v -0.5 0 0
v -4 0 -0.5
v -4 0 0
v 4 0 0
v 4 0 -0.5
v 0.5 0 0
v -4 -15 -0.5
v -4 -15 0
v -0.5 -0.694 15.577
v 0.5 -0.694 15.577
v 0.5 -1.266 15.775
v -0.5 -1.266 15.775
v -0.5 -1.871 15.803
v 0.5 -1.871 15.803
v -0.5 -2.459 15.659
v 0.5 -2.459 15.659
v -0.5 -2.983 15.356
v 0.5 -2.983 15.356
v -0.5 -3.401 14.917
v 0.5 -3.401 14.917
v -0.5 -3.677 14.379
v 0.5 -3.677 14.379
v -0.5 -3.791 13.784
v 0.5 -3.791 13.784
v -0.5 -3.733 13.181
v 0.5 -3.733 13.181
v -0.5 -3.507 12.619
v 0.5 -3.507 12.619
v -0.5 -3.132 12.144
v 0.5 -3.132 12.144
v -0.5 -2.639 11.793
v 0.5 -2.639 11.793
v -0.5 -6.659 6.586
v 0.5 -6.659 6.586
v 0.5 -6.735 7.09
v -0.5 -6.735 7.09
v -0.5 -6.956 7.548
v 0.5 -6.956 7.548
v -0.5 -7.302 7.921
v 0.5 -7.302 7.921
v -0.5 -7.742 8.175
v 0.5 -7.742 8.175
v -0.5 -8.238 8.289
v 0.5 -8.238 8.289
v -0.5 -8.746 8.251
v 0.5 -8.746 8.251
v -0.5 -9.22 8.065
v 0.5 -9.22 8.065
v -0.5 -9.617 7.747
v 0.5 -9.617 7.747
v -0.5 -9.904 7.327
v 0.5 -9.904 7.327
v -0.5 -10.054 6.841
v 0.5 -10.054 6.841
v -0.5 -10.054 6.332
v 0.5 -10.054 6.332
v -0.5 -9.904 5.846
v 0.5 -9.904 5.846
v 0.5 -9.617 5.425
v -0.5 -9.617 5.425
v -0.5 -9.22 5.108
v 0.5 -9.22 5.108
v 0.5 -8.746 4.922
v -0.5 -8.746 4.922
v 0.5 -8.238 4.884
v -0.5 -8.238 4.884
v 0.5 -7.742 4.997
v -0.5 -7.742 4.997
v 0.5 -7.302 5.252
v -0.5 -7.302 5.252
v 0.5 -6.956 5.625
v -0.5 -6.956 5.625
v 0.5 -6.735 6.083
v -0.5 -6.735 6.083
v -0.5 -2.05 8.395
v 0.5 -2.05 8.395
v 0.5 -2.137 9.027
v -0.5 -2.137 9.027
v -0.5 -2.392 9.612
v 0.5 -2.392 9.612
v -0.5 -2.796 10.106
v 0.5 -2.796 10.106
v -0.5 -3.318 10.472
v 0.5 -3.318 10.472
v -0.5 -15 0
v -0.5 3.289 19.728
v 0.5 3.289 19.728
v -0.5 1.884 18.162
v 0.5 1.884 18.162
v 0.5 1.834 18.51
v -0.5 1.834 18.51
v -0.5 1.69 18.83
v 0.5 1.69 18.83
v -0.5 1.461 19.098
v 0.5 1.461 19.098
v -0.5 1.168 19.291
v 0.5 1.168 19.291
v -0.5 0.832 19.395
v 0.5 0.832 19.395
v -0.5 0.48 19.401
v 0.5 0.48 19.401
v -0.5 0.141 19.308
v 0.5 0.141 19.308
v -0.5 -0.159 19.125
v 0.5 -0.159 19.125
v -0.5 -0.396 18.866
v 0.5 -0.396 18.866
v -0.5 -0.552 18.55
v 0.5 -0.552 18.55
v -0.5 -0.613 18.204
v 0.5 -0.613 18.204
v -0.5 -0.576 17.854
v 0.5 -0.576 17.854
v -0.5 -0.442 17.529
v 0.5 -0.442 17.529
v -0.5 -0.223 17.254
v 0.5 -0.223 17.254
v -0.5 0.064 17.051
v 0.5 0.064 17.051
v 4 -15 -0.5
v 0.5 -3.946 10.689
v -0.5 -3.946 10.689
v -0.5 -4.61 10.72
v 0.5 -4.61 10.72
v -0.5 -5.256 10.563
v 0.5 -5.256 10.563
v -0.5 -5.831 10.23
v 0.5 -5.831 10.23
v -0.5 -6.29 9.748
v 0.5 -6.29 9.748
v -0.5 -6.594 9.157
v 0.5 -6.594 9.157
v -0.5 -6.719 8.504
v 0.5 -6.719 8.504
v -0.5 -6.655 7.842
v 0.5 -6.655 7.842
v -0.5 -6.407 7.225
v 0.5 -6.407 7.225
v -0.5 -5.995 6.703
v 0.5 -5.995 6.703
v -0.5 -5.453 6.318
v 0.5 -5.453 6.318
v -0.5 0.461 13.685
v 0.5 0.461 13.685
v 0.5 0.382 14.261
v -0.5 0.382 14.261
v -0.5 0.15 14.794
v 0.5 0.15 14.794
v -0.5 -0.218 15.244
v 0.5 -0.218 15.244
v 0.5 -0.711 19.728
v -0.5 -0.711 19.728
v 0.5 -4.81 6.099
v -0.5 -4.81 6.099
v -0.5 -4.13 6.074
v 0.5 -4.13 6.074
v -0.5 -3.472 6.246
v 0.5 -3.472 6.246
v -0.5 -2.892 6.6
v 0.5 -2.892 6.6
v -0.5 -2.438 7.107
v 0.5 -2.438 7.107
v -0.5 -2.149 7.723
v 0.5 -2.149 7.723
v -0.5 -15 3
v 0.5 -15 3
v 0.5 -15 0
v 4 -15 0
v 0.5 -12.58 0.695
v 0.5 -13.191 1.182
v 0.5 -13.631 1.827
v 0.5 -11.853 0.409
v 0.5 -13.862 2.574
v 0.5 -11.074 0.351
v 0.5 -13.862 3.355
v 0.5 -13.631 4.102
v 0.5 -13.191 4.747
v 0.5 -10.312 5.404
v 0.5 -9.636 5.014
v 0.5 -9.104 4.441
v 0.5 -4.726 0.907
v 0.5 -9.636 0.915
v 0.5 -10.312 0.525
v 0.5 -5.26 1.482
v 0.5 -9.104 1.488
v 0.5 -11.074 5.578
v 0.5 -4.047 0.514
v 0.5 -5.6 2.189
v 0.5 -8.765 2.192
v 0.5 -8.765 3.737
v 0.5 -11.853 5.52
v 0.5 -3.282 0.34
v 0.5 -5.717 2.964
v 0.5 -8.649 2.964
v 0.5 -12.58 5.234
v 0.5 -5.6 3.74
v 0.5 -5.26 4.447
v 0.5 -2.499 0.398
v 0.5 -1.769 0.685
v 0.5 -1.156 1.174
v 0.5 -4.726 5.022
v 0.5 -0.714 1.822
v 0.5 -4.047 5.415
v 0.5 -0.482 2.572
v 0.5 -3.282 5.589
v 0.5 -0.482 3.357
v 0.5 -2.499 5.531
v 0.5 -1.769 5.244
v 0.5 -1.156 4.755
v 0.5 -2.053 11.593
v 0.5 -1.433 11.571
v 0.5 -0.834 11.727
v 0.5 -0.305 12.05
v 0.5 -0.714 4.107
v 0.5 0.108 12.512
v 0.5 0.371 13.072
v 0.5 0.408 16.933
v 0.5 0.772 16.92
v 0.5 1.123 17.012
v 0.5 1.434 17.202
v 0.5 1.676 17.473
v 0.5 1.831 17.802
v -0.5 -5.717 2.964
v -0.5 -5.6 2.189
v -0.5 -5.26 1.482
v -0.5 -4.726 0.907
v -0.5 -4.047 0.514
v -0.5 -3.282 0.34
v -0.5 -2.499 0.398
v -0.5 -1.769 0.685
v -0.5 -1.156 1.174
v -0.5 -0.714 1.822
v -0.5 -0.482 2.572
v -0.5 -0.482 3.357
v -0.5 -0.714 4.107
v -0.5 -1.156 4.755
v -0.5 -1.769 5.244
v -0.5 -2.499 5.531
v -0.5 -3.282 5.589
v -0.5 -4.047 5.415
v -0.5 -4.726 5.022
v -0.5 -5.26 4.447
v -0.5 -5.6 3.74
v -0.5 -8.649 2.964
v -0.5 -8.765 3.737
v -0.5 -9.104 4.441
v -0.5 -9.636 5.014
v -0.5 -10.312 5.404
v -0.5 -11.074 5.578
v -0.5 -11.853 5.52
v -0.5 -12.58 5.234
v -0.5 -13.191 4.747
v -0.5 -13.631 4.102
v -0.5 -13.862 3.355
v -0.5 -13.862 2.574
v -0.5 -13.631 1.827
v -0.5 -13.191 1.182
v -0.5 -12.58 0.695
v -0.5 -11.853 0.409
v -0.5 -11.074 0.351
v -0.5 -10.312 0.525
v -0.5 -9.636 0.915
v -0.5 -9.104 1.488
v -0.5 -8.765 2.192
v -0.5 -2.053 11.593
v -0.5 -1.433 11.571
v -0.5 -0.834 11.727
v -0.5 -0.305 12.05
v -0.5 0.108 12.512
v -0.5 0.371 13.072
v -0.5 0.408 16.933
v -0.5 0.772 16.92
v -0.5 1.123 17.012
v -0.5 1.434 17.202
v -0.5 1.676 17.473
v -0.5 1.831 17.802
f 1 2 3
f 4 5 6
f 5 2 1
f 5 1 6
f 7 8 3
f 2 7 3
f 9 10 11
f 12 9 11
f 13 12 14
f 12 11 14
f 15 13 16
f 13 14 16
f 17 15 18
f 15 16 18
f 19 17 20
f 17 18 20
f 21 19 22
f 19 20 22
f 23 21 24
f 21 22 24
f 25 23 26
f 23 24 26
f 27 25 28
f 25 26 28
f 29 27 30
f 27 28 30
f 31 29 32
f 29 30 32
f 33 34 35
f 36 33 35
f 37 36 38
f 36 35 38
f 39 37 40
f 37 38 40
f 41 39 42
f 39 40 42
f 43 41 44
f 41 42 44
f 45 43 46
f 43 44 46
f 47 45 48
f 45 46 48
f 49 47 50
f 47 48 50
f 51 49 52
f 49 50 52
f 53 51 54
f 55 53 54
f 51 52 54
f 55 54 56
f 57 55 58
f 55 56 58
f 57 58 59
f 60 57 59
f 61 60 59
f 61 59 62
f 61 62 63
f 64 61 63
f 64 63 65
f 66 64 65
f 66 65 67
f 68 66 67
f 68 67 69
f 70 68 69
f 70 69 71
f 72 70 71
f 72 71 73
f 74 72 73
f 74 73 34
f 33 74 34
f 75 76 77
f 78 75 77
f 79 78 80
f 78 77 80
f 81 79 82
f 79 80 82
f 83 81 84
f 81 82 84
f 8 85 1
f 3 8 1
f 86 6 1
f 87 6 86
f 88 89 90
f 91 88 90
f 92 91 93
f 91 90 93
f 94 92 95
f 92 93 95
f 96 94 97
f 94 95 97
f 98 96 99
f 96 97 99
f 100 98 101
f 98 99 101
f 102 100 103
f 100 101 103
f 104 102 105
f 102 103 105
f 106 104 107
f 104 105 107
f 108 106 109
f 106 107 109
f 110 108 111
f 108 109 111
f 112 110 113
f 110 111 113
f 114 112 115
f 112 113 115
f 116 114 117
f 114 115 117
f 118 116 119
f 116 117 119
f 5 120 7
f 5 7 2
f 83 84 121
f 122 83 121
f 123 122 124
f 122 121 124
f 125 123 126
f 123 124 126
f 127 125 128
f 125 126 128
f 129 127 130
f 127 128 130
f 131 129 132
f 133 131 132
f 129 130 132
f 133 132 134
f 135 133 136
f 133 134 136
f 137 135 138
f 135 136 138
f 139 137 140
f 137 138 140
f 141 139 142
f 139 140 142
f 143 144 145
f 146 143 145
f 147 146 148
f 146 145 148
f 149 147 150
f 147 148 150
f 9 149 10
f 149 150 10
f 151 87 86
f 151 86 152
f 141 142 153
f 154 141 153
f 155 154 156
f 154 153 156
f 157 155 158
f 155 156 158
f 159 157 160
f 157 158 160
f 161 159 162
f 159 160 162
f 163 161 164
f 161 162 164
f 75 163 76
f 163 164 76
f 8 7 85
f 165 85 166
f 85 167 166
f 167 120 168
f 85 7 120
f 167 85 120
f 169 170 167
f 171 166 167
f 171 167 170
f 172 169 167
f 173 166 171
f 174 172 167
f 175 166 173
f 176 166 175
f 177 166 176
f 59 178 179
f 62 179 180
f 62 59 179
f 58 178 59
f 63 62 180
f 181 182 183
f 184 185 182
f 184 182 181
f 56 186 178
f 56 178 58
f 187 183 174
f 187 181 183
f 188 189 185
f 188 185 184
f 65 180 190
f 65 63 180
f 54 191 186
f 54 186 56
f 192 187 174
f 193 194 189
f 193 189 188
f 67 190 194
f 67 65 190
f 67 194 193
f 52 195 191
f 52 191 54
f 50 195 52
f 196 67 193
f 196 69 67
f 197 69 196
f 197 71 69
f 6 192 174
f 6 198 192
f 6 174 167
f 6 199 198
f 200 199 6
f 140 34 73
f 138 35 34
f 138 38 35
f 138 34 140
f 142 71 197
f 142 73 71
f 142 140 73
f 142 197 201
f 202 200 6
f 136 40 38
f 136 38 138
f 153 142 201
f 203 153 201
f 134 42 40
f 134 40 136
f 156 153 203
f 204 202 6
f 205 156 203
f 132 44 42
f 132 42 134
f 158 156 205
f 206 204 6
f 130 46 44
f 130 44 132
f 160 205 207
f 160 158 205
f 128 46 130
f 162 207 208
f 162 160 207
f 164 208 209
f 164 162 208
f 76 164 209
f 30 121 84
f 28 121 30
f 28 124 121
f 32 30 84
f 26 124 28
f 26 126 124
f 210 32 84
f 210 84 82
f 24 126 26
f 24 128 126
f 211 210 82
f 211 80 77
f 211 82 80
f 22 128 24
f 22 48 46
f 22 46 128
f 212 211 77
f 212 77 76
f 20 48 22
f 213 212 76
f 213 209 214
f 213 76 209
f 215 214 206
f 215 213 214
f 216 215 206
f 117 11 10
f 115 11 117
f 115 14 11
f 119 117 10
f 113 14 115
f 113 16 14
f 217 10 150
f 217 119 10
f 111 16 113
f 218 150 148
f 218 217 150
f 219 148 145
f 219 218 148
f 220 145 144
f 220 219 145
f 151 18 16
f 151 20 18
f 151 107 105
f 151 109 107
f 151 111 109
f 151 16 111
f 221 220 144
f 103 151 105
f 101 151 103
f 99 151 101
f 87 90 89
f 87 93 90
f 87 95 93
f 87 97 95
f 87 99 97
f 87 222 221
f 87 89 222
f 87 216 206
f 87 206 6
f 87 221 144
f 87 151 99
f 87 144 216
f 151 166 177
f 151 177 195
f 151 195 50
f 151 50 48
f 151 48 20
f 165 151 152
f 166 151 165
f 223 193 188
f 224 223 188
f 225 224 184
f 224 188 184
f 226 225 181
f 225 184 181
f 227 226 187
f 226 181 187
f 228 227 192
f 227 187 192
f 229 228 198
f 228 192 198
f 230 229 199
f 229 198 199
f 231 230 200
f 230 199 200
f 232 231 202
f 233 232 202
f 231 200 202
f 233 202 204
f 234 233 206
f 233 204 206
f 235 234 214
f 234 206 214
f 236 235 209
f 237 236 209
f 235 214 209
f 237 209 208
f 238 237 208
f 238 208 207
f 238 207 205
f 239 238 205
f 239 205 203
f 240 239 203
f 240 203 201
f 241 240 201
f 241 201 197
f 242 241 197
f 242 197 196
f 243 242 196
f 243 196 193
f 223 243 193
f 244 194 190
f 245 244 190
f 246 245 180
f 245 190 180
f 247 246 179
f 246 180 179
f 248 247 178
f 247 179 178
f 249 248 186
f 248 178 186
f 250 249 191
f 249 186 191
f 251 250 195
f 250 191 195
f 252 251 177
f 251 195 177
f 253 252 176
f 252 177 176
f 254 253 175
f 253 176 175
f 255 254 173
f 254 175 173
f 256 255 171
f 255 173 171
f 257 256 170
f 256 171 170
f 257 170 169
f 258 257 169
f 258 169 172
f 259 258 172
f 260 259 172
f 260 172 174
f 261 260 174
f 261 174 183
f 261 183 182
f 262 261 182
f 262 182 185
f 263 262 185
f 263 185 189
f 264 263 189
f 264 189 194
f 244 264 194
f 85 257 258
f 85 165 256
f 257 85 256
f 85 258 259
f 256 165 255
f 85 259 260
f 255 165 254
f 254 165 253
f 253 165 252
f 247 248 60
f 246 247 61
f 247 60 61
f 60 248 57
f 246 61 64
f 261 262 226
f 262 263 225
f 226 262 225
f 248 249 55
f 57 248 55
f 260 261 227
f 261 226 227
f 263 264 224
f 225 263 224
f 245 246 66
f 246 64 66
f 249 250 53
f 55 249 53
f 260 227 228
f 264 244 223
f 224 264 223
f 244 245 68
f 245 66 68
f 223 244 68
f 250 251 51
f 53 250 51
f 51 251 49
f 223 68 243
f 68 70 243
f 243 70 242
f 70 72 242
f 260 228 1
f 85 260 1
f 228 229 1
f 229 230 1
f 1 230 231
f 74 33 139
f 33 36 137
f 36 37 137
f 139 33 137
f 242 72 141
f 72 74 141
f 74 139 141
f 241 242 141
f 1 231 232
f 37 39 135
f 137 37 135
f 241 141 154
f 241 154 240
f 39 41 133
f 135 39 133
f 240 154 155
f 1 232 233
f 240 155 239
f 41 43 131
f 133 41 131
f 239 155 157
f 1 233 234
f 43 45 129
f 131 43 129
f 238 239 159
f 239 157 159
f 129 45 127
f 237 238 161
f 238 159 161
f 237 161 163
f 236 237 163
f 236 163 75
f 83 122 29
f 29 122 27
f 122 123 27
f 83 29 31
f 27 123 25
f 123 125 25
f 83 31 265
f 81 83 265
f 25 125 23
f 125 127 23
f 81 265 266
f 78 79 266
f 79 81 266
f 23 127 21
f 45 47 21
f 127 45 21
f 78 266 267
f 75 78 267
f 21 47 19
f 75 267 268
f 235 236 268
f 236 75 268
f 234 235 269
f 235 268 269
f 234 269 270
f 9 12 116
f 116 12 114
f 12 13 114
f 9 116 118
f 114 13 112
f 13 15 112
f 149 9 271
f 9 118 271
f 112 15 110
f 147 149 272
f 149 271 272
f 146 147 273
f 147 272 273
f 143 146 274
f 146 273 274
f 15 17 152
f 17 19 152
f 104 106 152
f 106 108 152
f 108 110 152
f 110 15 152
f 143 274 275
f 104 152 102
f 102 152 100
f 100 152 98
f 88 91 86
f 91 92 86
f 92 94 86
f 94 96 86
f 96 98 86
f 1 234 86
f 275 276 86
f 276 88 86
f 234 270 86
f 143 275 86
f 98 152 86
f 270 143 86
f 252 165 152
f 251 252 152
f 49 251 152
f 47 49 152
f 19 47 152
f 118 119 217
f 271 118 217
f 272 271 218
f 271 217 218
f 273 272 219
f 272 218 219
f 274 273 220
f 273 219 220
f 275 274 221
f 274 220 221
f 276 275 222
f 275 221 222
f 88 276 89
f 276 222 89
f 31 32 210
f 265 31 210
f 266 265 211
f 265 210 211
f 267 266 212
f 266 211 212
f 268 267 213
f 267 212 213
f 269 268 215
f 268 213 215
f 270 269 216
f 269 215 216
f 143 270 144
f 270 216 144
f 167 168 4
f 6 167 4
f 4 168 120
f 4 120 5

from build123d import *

# Parameters (mm, degrees)
F1_DEPTH = 0.5
F2_W     = 15
F2_H     = 0.5
F3_DEPTH = 4
F4_R     = 2.6209807332
F5_DEPTH = 25
F6_R     = 1.7070089516
F7_DEPTH = 25


with BuildPart() as f1:
    # F0 (on Right) → F1 (new body, symmetric)
    with BuildSketch(Plane.YZ):
        Polygon((-15, 0), (0, 0), (3.2893587091, 19.7276485999), (-0.7106412909, 19.7276485999), (-15, 3), align=None)
    extrude(amount=F1_DEPTH, both=True)

    # F2 (on Right) → F3 (join, symmetric)
    with BuildSketch(Plane.YZ):
        with Locations((-7.5, -0.25)):
            Rectangle(F2_W, F2_H)
    extrude(amount=F3_DEPTH, both=True)

    # F4 (on face) → F5 (cut)
    with BuildSketch(Plane.YZ.offset(0.5)):
        with BuildLine():
            ThreePointArc((-0.4529937069, 2.964487765), (-3.0851524789, 5.5966465369), (-5.7173112508, 2.964487765))
            ThreePointArc((-5.7173112508, 2.964487765), (-3.0851524789, 0.332328993), (-0.4529937069, 2.964487765))
        make_face()
        with Locations((-11.2699056044, 2.964487765)):
            Circle(F4_R)
        with BuildLine():
            Line((-3.3178431468, 10.4724832487), (-5.453436658, 6.3182523414))
            ThreePointArc((-5.453436658, 6.3182523414), (-3.16893319, 6.4018223867), (-2.0501317095, 8.395367795))
            ThreePointArc((-2.0501317095, 8.395367795), (-2.392094494, 9.6120745074), (-3.3178431468, 10.4724832487))
        make_face()
        with BuildLine():
            ThreePointArc((-3.3178431468, 10.4724832487), (-6.462755356, 9.4631645506), (-5.453436658, 6.3182523414))
            Line((-5.453436658, 6.3182523414), (-3.3178431468, 10.4724832487))
        make_face()
        with BuildLine():
            Line((-0.6935525003, 15.577344851), (-2.6388447391, 11.7932946093))
            ThreePointArc((-2.6388447391, 11.7932946093), (-0.5579118075, 11.8694177852), (0.4611940407, 13.6853197301))
            ThreePointArc((0.4611940407, 13.6853197301), (0.1497033252, 14.7936065423), (-0.6935525003, 15.577344851))
        make_face()
        with BuildLine():
            ThreePointArc((-0.6935525003, 15.577344851), (-3.5582237405, 14.6579658495), (-2.6388447391, 11.7932946093))
            Line((-2.6388447391, 11.7932946093), (-0.6935525003, 15.577344851))
        make_face()
        with BuildLine():
            ThreePointArc((1.8837464303, 18.1615501642), (-0.0156576164, 19.2275183887), (0.0639659937, 17.0508962192))
            ThreePointArc((0.0639659937, 17.0508962192), (1.285512338, 17.0955819397), (1.8837464303, 18.1615501642))
        make_face()
    extrude(amount=-F5_DEPTH, mode=Mode.SUBTRACT)

    # F6 (on face) → F7 (cut)
    with BuildSketch(Plane.YZ.offset(0.5)):
        with Locations((-8.3660604432, 6.5863626078)):
            Circle(F6_R)
    extrude(amount=-F7_DEPTH, mode=Mode.SUBTRACT)


solid = f1.part
